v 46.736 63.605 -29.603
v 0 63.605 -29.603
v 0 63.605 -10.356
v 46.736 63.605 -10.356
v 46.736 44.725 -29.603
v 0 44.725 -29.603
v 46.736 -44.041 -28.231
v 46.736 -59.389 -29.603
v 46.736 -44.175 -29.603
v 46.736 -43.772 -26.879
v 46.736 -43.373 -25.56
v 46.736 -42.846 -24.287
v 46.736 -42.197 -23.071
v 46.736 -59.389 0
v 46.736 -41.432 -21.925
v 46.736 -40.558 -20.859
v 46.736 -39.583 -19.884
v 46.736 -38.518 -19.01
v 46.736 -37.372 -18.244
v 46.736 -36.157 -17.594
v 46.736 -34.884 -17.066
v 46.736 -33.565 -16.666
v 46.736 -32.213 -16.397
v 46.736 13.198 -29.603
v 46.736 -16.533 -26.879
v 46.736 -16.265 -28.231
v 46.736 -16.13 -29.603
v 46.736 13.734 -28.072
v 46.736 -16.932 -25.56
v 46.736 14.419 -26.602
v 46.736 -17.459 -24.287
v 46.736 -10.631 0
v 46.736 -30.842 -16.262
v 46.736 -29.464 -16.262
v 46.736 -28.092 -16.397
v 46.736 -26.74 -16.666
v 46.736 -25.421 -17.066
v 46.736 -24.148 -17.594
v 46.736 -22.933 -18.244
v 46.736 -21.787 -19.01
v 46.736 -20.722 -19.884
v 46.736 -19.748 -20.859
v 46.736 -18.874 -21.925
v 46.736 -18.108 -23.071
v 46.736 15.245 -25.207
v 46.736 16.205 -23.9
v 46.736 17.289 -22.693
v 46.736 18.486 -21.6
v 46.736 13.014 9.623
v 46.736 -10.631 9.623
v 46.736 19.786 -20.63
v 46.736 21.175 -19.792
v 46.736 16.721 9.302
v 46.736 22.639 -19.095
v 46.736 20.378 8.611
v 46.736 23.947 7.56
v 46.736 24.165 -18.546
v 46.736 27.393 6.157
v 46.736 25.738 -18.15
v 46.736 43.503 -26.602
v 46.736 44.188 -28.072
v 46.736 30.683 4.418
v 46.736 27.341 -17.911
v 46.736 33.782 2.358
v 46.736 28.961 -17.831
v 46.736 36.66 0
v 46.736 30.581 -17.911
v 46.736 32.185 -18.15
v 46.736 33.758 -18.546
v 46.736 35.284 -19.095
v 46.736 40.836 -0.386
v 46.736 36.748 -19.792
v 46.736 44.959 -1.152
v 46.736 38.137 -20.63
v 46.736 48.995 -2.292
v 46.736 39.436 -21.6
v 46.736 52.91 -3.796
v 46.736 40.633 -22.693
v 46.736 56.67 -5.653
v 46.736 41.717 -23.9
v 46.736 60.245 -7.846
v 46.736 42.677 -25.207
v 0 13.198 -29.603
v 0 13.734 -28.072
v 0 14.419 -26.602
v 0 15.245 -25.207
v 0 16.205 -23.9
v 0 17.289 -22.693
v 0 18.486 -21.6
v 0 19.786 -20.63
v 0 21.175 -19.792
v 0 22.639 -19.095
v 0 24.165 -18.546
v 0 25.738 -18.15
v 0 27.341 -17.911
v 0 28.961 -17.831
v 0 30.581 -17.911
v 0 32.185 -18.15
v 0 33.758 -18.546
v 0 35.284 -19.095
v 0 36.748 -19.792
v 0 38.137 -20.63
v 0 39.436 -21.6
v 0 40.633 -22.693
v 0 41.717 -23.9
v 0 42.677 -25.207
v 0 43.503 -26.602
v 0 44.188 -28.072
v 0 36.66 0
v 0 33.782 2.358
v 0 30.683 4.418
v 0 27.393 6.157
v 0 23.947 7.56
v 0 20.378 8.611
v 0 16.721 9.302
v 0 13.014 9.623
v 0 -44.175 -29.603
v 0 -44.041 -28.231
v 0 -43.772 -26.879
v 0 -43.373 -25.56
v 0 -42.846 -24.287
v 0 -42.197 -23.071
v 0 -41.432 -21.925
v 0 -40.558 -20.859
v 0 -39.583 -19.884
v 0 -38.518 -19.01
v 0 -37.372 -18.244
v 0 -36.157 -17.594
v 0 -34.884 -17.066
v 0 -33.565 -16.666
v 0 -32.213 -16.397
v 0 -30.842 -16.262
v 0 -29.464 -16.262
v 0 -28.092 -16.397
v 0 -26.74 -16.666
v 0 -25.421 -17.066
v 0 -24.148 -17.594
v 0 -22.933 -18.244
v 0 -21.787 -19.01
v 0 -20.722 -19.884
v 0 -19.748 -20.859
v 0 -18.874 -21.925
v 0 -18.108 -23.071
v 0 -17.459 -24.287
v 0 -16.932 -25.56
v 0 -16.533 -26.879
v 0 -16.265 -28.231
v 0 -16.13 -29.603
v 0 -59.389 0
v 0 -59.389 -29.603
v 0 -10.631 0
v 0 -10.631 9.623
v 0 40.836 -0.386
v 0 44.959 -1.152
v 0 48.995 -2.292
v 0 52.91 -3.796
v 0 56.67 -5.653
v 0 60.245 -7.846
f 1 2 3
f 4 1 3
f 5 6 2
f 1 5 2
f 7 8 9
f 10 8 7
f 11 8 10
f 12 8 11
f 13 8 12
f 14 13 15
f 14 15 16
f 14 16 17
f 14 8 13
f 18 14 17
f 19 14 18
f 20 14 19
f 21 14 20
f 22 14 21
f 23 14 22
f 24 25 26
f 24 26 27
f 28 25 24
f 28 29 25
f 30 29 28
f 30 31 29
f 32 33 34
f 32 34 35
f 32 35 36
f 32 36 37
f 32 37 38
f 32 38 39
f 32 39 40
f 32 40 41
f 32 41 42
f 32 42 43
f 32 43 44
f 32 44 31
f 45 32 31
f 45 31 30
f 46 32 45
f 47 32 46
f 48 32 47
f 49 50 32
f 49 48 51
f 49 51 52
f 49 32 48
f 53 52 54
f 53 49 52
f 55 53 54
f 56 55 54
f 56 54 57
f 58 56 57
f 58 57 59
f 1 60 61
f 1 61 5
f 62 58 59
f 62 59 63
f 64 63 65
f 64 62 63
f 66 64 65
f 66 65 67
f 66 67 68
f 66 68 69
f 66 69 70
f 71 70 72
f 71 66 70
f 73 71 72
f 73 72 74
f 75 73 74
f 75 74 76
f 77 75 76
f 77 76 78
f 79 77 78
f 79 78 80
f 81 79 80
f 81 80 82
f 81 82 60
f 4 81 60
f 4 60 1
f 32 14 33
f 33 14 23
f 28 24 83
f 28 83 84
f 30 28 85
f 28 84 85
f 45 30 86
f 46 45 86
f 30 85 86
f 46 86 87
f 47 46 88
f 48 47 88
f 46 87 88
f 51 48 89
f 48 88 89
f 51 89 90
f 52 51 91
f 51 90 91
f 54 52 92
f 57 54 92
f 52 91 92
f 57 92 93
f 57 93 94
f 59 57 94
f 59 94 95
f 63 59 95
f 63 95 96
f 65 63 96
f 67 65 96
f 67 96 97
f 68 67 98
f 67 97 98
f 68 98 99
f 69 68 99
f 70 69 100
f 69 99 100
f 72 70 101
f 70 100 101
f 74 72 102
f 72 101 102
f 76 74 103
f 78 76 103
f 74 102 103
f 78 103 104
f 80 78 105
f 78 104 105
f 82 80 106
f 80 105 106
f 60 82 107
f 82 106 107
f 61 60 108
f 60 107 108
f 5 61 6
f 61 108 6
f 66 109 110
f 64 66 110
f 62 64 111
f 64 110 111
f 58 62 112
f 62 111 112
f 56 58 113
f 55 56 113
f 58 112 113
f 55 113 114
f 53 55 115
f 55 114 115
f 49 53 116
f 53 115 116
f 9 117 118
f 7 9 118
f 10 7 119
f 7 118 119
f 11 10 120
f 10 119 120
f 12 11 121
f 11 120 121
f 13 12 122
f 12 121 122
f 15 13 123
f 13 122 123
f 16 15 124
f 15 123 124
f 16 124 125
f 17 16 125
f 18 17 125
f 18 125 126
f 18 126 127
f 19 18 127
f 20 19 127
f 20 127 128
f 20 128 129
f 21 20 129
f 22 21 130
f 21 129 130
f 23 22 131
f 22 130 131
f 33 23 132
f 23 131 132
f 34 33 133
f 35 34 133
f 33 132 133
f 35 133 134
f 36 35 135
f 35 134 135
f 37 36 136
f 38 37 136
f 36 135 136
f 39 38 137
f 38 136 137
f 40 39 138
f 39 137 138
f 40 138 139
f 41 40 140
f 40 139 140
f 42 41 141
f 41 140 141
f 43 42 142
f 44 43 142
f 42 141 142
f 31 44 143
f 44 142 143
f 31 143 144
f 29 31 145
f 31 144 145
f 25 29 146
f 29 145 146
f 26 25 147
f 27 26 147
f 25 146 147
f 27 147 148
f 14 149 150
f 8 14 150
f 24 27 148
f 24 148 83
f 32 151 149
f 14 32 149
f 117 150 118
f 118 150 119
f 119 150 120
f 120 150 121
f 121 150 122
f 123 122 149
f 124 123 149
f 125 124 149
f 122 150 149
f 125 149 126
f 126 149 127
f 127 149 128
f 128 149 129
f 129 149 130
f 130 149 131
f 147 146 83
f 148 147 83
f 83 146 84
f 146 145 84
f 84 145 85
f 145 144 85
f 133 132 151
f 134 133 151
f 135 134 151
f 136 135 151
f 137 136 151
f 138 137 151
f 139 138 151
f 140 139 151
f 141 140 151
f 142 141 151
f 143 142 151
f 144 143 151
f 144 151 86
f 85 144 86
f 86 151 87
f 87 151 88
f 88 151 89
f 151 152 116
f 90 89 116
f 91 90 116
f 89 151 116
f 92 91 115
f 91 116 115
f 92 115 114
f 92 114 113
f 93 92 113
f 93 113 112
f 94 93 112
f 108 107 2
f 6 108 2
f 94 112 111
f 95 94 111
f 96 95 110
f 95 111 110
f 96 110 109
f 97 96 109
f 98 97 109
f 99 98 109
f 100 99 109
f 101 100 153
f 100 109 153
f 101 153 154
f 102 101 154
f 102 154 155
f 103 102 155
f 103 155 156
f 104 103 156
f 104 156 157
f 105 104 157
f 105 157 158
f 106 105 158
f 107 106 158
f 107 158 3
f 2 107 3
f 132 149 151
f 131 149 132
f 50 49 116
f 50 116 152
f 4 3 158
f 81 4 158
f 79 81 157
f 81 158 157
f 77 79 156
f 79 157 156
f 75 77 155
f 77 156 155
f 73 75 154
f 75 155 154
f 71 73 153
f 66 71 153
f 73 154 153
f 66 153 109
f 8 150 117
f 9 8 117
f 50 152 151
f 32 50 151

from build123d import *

# Parameters (mm, degrees)
F1_DEPTH = 46.736


with BuildPart() as f1:
    # F0 (on Right) → F1 (new body)
    with BuildSketch(Plane.YZ):
        with BuildLine():
            Line((-10.631341, 9.623196), (-10.631341, 0))
            Line((-10.631341, 0), (-59.388869, 0))
            Line((-59.388869, 0), (-59.388869, -29.602783))
            Line((-59.388869, -29.602783), (-44.175051, -29.602783))
            ThreePointArc((-44.175051, -29.602783), (-30.15268, -16.245136), (-16.13031, -29.602783))
            Line((-16.13031, -29.602783), (13.197524, -29.602783))
            ThreePointArc((13.197524, -29.602783), (28.961235, -17.830947), (44.724945, -29.602783))
            Line((44.724945, -29.602783), (63.604742, -29.602783))
            Line((63.604742, -29.602783), (63.604742, -10.356392))
            ThreePointArc((63.604742, -10.356392), (50.969791, -2.999156), (36.659796, 0))
            ThreePointArc((36.659796, 0), (25.687596, 6.901607), (13.014226, 9.623196))
            Line((13.014226, 9.623196), (-10.631341, 9.623196))
        make_face()
    extrude(amount=F1_DEPTH)


solid = f1.part
